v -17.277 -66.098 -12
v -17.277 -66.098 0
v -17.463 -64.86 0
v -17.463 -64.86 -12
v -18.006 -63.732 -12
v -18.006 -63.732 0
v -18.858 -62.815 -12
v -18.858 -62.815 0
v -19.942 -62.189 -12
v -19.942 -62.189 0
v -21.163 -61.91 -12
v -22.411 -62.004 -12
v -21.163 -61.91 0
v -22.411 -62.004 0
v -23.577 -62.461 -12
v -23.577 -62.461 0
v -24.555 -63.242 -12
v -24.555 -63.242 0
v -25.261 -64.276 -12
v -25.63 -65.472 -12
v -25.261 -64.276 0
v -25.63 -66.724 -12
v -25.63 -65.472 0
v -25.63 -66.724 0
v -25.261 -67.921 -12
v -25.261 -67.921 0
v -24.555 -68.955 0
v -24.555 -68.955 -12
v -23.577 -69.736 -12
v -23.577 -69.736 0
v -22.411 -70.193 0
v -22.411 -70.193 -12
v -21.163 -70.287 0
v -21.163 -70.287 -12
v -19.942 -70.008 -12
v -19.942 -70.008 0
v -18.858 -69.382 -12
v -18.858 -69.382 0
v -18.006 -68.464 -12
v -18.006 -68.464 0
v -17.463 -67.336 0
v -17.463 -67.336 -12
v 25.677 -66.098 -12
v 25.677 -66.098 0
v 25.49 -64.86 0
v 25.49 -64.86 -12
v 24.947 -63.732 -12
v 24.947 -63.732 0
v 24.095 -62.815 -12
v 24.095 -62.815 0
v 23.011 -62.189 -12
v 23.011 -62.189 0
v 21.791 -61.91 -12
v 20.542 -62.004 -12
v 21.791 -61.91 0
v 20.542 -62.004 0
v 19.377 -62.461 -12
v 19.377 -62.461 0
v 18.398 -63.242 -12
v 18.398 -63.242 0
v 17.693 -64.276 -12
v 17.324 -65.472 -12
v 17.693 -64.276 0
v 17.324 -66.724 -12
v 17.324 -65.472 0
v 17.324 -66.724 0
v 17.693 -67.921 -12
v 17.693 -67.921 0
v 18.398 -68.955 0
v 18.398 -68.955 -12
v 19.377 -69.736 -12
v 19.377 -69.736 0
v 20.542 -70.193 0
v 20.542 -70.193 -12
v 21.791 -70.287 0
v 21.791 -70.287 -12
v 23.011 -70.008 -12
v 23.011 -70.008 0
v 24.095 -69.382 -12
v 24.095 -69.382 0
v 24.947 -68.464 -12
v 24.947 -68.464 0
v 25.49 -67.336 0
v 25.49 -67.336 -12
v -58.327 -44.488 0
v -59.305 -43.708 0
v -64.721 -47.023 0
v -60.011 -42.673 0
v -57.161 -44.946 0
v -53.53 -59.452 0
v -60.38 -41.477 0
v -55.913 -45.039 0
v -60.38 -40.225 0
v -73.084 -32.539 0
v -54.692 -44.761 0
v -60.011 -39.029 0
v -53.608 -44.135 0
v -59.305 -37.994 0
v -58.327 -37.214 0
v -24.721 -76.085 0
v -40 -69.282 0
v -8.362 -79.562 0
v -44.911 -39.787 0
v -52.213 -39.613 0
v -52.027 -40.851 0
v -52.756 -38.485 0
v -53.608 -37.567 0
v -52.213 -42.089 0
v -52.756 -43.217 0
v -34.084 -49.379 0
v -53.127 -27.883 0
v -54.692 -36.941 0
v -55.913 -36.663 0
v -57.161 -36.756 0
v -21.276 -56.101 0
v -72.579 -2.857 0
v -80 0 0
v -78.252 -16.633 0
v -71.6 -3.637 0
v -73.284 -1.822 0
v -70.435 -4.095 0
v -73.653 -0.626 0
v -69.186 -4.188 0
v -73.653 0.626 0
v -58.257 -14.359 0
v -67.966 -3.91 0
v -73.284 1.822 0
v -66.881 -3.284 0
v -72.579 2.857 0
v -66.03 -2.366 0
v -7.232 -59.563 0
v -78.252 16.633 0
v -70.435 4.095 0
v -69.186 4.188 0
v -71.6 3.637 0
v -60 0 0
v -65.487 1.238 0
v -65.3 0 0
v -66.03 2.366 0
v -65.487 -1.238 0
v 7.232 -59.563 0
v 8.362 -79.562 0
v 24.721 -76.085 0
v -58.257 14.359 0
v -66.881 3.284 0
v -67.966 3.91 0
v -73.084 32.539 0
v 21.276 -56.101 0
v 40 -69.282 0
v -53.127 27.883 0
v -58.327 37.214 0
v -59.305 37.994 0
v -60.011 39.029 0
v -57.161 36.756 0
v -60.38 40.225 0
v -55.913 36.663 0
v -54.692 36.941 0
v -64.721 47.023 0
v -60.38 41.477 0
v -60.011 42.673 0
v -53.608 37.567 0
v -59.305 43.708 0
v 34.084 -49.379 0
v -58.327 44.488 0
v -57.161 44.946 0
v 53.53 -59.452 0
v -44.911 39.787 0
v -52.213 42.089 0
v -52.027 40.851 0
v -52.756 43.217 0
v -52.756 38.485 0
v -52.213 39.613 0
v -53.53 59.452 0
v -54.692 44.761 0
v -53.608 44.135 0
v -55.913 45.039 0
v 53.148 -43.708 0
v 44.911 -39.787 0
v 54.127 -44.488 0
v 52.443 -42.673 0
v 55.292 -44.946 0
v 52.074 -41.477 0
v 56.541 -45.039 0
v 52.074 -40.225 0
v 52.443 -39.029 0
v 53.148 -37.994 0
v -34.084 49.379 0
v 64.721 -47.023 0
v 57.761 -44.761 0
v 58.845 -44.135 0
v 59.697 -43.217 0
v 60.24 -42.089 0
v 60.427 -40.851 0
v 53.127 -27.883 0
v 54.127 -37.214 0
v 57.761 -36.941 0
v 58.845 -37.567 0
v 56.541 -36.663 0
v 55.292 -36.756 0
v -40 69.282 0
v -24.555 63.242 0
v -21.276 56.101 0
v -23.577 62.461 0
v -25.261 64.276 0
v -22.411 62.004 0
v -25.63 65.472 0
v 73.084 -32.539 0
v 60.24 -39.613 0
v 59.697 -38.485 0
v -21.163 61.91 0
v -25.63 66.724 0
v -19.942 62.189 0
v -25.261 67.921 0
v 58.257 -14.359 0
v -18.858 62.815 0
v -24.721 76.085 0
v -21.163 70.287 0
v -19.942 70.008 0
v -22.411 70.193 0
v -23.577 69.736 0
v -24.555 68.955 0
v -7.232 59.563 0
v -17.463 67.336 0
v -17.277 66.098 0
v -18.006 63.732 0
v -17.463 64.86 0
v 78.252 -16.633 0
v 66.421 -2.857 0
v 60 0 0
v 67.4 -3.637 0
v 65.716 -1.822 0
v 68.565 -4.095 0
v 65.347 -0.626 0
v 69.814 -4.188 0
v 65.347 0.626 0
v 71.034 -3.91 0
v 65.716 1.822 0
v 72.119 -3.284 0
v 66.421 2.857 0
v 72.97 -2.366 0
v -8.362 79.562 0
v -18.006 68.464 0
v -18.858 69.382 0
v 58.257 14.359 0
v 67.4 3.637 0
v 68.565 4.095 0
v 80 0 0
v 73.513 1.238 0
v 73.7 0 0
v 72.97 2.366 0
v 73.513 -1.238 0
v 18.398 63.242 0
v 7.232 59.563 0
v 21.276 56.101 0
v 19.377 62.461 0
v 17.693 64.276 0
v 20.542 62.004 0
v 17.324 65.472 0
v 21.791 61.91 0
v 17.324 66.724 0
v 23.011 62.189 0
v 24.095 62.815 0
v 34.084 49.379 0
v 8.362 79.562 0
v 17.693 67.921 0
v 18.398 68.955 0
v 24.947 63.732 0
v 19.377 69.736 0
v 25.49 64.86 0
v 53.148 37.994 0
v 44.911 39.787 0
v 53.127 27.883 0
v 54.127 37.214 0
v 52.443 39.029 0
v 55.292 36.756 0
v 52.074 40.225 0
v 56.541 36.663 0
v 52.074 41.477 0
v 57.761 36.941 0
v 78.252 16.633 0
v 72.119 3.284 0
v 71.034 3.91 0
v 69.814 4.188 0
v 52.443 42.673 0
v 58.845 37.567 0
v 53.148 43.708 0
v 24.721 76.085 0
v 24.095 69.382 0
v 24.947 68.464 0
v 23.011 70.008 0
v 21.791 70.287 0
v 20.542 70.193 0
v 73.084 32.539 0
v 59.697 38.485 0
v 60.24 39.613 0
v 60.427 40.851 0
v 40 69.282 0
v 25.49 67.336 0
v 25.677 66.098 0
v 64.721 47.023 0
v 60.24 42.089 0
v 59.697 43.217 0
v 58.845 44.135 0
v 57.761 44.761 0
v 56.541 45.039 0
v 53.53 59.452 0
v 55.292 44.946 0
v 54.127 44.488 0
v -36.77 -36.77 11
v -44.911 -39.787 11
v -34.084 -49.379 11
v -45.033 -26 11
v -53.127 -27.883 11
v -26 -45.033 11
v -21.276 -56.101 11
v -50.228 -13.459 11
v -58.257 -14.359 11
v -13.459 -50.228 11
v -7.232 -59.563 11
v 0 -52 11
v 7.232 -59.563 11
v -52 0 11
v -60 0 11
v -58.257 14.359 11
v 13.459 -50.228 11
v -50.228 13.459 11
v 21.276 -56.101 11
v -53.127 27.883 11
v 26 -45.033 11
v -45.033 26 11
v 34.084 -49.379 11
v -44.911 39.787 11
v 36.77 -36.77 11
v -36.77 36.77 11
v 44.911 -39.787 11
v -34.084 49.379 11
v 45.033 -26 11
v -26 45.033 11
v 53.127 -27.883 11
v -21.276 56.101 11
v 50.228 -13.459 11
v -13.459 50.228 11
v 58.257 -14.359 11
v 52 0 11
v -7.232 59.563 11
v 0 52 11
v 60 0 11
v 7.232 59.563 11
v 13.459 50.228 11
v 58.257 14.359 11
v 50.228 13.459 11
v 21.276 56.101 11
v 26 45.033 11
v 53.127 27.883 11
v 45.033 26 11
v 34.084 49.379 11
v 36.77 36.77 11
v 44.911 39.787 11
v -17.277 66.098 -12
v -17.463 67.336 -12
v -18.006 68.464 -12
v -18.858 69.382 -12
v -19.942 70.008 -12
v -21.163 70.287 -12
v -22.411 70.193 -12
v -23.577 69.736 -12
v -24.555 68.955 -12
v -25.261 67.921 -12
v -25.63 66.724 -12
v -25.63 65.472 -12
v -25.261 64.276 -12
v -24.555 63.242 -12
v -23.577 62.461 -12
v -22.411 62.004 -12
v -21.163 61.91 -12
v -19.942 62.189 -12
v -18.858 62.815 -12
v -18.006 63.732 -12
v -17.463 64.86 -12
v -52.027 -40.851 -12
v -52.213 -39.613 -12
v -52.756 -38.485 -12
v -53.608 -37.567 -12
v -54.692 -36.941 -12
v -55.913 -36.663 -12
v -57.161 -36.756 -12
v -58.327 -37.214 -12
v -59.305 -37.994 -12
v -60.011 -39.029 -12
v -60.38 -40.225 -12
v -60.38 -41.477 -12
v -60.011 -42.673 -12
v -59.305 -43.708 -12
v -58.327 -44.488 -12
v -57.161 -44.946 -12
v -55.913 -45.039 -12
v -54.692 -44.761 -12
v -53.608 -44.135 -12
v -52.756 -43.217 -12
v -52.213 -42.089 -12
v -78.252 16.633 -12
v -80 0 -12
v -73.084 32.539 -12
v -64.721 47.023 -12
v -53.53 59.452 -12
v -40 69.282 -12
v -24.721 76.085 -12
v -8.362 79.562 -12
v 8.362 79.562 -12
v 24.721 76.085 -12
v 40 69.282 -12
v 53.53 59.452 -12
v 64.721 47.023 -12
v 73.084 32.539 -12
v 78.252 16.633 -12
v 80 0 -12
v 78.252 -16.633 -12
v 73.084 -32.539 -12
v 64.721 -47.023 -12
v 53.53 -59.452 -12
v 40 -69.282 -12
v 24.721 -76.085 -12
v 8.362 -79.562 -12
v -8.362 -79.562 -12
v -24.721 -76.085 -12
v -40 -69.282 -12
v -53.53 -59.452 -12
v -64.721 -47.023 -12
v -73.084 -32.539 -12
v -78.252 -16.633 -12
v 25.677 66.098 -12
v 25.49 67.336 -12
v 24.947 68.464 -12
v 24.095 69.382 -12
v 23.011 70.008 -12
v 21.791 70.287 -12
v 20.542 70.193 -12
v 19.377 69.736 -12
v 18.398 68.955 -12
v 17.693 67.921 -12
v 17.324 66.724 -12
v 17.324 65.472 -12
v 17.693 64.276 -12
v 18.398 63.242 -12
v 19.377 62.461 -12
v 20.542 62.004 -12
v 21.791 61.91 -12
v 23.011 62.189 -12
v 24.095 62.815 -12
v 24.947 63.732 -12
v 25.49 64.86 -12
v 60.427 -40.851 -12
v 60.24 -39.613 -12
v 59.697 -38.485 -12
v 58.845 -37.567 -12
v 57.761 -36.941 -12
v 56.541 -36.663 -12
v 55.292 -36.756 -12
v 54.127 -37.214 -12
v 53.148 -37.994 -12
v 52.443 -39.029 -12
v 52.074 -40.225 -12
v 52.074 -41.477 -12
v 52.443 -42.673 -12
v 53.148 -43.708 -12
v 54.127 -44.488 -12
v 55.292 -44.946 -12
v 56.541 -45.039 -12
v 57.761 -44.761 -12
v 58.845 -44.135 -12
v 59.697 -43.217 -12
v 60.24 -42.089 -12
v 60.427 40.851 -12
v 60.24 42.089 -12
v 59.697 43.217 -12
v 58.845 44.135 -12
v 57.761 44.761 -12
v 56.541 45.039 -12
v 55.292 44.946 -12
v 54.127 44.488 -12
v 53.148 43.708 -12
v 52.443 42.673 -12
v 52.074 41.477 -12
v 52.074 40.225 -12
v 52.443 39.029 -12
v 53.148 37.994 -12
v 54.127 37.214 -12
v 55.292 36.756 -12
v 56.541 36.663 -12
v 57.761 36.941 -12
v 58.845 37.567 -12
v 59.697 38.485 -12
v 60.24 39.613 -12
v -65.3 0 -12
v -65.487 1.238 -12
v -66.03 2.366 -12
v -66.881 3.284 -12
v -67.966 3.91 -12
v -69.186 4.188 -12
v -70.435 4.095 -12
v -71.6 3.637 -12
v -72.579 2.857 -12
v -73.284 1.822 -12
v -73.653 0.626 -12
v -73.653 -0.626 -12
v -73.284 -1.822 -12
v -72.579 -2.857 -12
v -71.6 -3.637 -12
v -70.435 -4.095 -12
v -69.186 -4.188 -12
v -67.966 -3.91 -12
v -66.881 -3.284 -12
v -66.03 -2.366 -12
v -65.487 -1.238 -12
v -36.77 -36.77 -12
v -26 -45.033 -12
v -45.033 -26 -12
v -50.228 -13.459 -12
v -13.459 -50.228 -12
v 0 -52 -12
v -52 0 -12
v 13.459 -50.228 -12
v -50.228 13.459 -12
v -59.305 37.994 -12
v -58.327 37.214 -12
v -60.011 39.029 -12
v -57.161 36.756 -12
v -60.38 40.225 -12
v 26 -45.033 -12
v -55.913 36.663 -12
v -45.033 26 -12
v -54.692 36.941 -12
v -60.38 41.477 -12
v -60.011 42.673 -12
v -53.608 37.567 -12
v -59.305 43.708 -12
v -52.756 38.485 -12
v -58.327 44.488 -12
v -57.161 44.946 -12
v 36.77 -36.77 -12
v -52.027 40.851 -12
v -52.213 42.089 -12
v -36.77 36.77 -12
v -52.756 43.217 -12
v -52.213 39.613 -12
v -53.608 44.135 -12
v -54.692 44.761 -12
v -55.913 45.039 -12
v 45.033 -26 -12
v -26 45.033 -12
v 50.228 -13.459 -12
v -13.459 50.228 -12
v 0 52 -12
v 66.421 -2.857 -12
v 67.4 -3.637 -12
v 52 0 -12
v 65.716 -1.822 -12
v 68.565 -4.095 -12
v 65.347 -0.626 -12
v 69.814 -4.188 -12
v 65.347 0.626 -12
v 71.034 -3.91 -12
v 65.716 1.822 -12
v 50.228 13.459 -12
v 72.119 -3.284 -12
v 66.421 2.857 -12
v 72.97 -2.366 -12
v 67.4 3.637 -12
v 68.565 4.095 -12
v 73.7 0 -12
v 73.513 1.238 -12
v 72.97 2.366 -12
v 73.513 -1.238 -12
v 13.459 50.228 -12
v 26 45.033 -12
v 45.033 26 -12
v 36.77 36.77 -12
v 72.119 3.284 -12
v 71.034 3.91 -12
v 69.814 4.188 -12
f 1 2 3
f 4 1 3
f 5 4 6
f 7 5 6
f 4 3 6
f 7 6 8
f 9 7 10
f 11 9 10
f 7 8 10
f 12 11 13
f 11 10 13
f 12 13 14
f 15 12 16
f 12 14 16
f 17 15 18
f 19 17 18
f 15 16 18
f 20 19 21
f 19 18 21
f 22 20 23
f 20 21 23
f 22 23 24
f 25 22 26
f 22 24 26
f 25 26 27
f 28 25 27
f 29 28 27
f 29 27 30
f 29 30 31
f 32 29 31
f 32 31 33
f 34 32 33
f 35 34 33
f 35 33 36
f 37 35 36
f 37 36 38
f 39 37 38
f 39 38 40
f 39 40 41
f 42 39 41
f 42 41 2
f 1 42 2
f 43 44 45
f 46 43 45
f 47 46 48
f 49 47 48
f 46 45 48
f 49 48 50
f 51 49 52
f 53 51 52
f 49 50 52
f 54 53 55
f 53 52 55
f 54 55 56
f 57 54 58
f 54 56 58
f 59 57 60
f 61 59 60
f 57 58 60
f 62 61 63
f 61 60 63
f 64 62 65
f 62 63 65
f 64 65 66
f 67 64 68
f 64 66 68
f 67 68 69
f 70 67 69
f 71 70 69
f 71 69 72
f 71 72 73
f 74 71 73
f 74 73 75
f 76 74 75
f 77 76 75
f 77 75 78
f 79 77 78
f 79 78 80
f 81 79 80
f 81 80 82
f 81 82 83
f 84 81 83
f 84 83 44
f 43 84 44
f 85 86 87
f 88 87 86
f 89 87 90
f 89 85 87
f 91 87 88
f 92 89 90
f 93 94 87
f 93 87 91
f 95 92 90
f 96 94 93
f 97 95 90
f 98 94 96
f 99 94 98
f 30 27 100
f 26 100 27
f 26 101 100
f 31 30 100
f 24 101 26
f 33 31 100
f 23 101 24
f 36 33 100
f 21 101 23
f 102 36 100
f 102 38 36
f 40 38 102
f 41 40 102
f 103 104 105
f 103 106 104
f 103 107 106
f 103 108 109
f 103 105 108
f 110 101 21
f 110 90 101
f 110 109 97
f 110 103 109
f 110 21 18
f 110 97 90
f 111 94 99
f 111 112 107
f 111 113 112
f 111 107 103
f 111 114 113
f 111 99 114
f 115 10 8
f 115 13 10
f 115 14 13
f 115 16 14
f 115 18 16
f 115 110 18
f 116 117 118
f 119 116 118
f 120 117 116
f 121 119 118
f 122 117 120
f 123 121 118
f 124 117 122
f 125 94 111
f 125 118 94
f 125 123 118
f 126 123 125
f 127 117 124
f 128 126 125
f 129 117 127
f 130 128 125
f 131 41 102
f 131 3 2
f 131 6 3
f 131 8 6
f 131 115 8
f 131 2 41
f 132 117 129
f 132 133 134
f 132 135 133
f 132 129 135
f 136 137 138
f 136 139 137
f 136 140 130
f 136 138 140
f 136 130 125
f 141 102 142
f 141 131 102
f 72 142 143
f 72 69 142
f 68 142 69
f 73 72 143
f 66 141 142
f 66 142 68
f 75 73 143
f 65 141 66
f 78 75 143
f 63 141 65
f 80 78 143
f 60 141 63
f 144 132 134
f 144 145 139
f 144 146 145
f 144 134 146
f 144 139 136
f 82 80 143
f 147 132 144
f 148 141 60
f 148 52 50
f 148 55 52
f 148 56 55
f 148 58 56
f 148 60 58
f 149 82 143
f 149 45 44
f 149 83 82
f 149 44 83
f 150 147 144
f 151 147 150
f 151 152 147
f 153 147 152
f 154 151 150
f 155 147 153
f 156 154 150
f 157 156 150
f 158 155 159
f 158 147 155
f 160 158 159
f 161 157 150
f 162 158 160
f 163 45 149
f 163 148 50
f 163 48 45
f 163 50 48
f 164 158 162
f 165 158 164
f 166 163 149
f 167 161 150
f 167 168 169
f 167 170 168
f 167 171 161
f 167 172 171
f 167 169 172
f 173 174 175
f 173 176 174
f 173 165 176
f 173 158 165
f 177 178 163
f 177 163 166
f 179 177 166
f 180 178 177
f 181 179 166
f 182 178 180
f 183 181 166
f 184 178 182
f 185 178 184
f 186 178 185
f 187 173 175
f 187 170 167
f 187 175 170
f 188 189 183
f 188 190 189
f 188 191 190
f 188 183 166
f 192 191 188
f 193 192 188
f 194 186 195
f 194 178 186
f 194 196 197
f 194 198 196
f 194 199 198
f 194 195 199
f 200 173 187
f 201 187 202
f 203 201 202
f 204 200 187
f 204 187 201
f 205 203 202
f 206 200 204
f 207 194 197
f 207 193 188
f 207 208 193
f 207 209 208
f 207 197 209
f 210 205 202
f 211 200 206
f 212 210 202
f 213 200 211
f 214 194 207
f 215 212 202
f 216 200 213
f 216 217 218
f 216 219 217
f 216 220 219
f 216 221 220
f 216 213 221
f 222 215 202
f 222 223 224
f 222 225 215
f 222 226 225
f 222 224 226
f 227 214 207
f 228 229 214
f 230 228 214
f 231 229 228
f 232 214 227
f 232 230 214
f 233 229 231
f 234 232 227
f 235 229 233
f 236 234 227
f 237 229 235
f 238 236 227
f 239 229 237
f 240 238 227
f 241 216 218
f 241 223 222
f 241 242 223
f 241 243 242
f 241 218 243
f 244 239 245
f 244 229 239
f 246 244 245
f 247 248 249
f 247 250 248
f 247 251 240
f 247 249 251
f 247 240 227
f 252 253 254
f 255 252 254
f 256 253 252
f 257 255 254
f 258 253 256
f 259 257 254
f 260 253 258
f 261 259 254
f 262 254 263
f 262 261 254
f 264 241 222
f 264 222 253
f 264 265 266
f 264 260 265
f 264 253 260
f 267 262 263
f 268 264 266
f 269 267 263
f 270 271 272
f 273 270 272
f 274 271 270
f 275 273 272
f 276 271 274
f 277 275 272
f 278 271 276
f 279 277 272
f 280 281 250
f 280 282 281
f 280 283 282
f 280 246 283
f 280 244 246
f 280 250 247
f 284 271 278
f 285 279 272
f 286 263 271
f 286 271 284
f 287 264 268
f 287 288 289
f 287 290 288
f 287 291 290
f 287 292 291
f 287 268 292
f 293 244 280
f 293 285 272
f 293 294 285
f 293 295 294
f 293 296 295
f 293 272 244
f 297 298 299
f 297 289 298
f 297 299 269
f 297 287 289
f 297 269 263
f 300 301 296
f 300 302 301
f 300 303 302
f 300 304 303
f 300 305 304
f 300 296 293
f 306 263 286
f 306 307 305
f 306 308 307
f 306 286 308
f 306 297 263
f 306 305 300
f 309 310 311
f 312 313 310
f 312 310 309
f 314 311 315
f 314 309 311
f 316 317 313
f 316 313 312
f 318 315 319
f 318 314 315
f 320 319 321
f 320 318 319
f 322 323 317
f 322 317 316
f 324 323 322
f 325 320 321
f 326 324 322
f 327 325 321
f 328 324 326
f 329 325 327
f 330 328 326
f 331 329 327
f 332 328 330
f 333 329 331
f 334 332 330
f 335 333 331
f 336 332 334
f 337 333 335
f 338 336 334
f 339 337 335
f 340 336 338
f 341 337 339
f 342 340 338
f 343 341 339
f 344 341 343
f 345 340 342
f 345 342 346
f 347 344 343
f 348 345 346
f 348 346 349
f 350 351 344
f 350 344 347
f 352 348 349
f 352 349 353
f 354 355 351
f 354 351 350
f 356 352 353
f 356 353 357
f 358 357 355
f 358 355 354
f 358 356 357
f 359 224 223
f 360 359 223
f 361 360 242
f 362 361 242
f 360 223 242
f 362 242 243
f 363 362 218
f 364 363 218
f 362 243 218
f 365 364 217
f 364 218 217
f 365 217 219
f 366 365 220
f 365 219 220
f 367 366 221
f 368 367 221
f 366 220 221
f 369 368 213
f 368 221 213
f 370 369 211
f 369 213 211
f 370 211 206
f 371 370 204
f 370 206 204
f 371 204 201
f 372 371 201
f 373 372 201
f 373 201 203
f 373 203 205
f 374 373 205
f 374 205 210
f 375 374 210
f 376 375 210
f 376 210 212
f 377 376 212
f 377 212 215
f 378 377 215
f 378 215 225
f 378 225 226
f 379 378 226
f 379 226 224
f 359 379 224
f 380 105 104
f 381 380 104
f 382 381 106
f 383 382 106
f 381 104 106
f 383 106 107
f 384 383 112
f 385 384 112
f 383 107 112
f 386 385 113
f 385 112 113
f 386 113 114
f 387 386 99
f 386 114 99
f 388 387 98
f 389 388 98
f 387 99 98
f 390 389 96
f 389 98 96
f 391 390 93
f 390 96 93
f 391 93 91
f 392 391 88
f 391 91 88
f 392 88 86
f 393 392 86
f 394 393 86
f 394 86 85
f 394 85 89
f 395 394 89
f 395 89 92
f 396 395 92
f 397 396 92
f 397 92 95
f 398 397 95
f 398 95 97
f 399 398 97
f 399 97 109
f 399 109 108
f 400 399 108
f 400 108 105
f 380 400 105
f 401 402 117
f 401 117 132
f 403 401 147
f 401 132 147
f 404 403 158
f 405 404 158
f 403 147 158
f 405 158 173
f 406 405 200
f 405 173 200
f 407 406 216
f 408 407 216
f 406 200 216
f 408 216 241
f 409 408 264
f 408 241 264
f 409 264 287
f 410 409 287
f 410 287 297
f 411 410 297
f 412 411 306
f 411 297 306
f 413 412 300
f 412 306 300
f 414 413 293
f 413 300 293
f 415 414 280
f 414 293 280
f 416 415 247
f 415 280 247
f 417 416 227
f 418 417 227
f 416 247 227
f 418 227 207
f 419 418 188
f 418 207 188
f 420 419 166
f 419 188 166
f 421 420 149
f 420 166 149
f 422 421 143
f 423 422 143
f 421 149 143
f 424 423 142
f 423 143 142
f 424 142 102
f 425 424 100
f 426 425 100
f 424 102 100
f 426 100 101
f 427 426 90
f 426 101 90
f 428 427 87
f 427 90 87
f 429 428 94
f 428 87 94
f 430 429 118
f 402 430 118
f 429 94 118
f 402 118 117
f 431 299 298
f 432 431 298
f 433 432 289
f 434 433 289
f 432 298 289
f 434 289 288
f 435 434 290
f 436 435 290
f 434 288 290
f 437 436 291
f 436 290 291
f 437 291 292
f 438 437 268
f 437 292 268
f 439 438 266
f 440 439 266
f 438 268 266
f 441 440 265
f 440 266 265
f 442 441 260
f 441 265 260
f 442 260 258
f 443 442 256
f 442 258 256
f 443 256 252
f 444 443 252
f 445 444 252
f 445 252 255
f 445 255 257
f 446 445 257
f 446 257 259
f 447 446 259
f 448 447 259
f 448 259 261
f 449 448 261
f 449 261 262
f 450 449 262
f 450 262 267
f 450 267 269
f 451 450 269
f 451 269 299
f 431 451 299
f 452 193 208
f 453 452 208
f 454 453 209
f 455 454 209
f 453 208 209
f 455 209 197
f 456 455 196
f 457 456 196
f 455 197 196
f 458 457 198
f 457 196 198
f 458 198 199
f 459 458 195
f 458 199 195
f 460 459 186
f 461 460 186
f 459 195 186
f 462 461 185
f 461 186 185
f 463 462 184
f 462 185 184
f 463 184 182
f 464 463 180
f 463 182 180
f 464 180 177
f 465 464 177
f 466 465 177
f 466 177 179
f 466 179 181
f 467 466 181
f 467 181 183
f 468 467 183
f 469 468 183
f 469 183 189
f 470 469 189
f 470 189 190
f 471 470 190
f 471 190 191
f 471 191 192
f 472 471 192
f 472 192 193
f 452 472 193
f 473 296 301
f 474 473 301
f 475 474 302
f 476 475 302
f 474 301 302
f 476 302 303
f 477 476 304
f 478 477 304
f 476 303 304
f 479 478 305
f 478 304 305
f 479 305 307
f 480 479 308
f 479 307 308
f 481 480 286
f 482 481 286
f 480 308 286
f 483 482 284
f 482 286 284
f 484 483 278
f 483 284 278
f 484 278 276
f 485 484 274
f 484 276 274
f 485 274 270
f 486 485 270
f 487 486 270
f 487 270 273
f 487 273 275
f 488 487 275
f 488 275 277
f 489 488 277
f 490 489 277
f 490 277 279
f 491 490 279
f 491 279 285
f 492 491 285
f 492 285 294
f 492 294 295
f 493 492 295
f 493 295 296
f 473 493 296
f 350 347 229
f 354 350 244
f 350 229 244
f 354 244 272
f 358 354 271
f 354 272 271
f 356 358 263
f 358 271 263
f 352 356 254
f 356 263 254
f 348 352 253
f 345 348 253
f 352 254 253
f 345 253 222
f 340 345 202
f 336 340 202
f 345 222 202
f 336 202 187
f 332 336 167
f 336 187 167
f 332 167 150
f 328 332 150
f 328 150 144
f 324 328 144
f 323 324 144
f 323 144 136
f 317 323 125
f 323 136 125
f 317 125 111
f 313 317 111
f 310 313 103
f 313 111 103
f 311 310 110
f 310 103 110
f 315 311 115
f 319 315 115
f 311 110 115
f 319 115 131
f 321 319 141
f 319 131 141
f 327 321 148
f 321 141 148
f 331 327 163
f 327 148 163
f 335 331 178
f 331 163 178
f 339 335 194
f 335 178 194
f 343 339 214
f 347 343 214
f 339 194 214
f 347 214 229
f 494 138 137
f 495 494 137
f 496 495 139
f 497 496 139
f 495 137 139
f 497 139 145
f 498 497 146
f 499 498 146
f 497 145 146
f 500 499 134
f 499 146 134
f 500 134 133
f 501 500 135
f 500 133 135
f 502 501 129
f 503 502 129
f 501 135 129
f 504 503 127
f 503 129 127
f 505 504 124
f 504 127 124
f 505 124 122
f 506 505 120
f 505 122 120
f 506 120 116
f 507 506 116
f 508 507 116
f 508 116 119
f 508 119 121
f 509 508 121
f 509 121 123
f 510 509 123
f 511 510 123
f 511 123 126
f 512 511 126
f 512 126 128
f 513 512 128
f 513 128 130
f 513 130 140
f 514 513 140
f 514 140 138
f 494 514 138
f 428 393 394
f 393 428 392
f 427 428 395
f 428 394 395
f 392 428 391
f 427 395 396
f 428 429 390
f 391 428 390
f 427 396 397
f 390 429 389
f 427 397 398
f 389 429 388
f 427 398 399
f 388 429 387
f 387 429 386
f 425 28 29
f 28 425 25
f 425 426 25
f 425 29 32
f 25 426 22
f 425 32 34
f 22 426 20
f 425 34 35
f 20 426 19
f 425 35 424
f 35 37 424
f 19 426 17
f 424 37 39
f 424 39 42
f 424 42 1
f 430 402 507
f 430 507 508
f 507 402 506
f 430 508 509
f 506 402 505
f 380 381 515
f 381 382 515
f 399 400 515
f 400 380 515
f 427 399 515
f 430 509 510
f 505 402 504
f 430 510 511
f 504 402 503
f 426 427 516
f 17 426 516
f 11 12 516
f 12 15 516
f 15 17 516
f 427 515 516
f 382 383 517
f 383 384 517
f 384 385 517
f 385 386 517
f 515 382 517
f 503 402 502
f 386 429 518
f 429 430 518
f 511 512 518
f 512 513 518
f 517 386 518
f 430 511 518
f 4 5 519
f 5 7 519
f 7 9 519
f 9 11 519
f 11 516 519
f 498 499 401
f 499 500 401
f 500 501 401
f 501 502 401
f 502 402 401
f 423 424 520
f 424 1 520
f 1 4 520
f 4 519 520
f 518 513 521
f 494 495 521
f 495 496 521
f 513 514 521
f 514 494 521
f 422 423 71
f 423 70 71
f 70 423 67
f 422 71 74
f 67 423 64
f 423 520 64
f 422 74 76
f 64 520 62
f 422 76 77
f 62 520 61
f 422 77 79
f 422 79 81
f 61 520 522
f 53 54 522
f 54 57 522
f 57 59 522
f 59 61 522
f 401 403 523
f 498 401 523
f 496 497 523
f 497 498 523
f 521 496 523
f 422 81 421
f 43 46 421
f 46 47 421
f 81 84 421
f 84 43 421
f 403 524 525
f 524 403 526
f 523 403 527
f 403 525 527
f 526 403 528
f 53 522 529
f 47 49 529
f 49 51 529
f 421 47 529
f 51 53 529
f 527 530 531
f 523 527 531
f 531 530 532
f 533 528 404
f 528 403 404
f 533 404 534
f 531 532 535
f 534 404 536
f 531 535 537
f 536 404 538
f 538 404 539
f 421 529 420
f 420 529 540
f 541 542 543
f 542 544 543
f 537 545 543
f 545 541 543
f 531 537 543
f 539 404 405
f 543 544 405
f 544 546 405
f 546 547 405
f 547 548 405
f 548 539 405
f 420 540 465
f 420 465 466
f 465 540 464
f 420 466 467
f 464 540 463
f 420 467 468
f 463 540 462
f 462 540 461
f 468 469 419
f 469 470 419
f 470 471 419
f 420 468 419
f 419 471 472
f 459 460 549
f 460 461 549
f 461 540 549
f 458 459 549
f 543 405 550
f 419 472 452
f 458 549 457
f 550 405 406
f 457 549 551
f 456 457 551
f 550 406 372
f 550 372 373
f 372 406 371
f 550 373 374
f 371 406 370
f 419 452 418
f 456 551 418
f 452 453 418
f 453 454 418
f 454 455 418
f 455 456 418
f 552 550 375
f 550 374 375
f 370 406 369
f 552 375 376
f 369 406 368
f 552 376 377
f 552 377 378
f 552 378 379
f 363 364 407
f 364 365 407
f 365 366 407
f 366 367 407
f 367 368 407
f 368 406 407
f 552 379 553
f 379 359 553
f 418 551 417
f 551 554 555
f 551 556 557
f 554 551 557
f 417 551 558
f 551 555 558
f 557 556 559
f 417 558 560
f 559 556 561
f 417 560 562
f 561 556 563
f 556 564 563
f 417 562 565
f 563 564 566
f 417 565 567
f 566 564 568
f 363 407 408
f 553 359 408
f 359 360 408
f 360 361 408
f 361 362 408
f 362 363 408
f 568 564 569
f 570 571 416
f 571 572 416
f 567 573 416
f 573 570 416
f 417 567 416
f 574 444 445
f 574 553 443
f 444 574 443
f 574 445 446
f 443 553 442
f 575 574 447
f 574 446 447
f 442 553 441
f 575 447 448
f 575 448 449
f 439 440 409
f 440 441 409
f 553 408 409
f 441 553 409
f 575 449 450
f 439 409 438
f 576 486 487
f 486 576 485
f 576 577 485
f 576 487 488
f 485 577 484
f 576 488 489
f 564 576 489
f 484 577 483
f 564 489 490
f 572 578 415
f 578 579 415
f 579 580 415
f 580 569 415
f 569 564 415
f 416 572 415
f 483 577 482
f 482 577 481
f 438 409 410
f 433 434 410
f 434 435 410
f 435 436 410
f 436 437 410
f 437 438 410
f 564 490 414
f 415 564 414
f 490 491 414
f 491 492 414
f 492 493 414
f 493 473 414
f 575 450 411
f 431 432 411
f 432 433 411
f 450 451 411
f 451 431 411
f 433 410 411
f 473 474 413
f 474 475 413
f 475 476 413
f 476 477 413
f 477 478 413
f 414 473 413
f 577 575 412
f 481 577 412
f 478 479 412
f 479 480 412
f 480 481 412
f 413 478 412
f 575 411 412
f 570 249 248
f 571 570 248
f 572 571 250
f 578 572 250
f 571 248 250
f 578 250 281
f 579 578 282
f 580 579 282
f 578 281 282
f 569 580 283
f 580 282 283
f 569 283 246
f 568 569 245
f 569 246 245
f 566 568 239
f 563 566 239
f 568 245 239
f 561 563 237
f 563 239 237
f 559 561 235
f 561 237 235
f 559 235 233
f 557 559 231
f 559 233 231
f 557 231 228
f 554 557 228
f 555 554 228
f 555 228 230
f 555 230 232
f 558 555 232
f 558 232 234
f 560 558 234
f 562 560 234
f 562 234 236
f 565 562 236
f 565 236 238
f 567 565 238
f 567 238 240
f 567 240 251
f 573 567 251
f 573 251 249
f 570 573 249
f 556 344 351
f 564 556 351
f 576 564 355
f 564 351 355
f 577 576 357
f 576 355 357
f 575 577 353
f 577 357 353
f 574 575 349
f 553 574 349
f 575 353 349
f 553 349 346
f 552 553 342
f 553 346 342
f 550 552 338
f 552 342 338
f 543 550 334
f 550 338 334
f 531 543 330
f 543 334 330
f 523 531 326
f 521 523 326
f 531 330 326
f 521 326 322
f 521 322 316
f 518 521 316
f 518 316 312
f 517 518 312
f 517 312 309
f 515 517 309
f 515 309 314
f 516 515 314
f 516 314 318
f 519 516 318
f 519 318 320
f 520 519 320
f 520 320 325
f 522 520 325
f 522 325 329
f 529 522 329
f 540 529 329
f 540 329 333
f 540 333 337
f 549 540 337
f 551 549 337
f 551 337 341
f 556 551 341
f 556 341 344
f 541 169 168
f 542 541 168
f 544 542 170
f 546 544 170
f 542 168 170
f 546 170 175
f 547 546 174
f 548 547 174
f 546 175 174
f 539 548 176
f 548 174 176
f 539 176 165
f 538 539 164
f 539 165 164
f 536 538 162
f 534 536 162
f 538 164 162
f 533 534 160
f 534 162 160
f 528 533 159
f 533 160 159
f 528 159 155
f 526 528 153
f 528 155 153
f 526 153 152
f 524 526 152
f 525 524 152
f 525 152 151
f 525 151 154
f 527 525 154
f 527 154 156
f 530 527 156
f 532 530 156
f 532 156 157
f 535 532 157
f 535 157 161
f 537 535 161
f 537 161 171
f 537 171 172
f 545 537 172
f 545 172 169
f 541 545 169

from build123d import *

# Parameters (mm, degrees)
SKETCH1_W                      = 80
SKETCH1_H                      = 12
SKETCH2_R                      = 60
BOSS_EXTRUDE1_DEPTH            = 11
F_8_4_8_4_DIAMETER_HOLE1_D     = 8.4
F_8_4_8_4_DIAMETER_HOLE1_DEPTH = 23
M100_CLEARANCE_HOLE1_D         = 104


with BuildPart() as part:
    # Sketch1 → Revolve1 (revolve)
    with BuildSketch(Plane.XZ, mode=Mode.PRIVATE) as revolve1_sk:
        with Locations((40, -6)):
            Rectangle(SKETCH1_W, SKETCH1_H)
    revolve(revolve1_sk.sketch.rotate(Axis((0, 0, 0), (0, 0, -1)), 180), axis=Axis((0, 0, 0), (0, 0, -1)))

    # Sketch2 → Boss-Extrude1 (add)
    with BuildSketch(Plane.XY):
        Circle(SKETCH2_R)
    extrude(amount=BOSS_EXTRUDE1_DEPTH)

    # Ø8.4 (8.4) Diameter Hole1
    with Locations(Plane(origin=(0, 0, -12), x_dir=(-1, 0, 0), z_dir=(0, 0, -1))):
        with Locations((21.476681109, 66.098427883), (56.226681109, 40.851075034), (69.5, 0), (56.226681109, -40.851075034), (21.476681109, -66.098427883), (-21.476681109, -66.098427883), (-56.226681109, -40.851075034), (-69.5, 0), (-56.226681109, 40.851075034), (-21.476681109, 66.098427883)):
            Hole(F_8_4_8_4_DIAMETER_HOLE1_D / 2, depth=F_8_4_8_4_DIAMETER_HOLE1_DEPTH)

    # M100 Clearance Hole1 (through all)
    with Locations(Plane(origin=(0, 0, -12), x_dir=(-1, 0, 0), z_dir=(0, 0, -1))):
        with Locations((0, 0)):
            Hole(M100_CLEARANCE_HOLE1_D / 2)


solid = part.part
